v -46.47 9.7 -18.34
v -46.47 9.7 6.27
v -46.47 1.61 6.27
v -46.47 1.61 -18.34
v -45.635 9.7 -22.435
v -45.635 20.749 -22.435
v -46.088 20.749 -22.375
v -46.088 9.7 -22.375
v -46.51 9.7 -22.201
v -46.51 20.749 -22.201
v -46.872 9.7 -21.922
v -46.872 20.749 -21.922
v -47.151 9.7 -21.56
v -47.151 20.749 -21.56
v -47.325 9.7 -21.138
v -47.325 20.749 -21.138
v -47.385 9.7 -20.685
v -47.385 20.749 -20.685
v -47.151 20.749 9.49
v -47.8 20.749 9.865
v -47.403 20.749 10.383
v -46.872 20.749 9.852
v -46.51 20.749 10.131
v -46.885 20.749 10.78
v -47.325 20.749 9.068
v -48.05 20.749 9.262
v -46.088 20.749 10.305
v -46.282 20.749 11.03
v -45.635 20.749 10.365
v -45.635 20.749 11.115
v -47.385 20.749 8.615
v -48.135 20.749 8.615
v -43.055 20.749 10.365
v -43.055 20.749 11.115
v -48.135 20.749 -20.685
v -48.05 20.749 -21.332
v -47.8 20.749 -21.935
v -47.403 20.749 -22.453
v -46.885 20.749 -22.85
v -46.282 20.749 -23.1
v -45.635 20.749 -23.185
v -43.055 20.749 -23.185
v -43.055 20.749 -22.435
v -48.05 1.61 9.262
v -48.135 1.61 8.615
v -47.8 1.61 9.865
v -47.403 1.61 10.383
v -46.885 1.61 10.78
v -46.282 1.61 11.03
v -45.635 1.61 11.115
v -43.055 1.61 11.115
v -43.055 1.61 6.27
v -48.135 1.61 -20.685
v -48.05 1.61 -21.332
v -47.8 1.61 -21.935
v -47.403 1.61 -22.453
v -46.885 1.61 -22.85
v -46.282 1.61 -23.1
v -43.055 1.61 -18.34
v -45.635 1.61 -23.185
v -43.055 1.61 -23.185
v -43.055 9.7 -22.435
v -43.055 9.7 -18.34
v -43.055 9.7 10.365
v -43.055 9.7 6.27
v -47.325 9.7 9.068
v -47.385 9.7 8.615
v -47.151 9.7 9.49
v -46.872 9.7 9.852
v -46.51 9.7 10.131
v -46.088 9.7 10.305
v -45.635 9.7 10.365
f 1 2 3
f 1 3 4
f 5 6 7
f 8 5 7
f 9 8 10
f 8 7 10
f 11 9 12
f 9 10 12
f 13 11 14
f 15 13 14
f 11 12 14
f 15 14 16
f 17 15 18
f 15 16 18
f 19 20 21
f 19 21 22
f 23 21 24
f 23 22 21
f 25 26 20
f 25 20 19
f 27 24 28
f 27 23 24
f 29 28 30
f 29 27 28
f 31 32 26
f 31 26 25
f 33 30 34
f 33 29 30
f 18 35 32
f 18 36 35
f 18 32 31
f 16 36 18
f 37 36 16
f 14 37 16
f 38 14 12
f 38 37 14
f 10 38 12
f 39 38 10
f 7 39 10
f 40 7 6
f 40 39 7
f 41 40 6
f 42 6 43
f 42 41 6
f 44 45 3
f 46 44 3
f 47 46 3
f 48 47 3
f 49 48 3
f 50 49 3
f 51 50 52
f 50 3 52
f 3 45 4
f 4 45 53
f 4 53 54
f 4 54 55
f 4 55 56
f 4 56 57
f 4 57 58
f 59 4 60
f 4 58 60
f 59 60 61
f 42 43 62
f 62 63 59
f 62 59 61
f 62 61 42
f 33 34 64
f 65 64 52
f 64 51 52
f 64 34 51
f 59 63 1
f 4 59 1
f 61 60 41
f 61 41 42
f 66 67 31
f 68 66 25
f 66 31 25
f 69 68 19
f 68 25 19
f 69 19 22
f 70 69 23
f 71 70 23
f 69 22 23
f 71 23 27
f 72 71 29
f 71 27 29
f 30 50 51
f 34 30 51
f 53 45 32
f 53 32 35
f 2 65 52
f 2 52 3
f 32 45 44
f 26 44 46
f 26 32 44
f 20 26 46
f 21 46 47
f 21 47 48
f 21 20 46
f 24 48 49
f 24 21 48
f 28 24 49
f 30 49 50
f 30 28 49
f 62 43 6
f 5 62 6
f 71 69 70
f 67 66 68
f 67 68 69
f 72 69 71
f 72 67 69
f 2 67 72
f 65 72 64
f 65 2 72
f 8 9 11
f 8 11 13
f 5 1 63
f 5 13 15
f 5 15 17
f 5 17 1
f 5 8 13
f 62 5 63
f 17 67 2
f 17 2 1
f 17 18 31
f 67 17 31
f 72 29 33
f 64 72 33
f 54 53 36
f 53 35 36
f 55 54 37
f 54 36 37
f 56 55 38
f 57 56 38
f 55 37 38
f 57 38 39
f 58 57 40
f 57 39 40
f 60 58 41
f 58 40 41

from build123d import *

# Parameters (mm, degrees)
SKETCH2_W           = 5.08
SKETCH2_H           = 34.3
BOSS_EXTRUDE1_DEPTH = 19.1389
FILLET1_R           = 2.5
SKETCH3_W           = 3.415
SKETCH3_H           = 24.61
CUT_EXTRUDE1_DEPTH  = 55.558231654
CUT_EXTRUDE2_DEPTH  = 11.0489


with BuildPart() as part:
    # Sketch2 → Boss-Extrude1 (new body)
    with BuildSketch(Plane(origin=(0, 1.61, 0), x_dir=(1, 0, 0), z_dir=(0, 1, 0))):
        with Locations((-45.595, 6.035)):
            Rectangle(SKETCH2_W, SKETCH2_H)
    extrude(amount=BOSS_EXTRUDE1_DEPTH)

    # Fillet1
    fillet1_edges = [part.edges().sort_by_distance(p)[0] for p in [
        (-48.135, 11.17945, -23.185),
        (-48.135, 11.17945, 11.115),
    ]]
    fillet(fillet1_edges, radius=FILLET1_R)

    # Sketch3 → Cut-Extrude1 (cut, through all)
    with BuildSketch(Plane(origin=(0, 9.7, 0), x_dir=(-1, 0, 0), z_dir=(0, -1, 0))):
        with Locations((44.7625, 6.035)):
            Rectangle(SKETCH3_W, SKETCH3_H)
    extrude(amount=CUT_EXTRUDE1_DEPTH, mode=Mode.SUBTRACT)

    # Sketch4 → Cut-Extrude2 (cut)
    with BuildSketch(Plane(origin=(0, 20.7489, 0), x_dir=(1, 0, 0), z_dir=(0, 1, 0))):
        with BuildLine():
            Line((-43.055, -10.365), (-43.055, 22.435))
            Line((-43.055, 22.435), (-45.635, 22.435))
            ThreePointArc((-45.635, 22.435), (-46.872436867, 21.922436867), (-47.385, 20.685))
            Line((-47.385, 20.685), (-47.385, -8.615))
            ThreePointArc((-47.385, -8.615), (-46.872436867, -9.852436867), (-45.635, -10.365))
            Line((-45.635, -10.365), (-43.055, -10.365))
        make_face()
    extrude(amount=-CUT_EXTRUDE2_DEPTH, mode=Mode.SUBTRACT)


solid = part.part
